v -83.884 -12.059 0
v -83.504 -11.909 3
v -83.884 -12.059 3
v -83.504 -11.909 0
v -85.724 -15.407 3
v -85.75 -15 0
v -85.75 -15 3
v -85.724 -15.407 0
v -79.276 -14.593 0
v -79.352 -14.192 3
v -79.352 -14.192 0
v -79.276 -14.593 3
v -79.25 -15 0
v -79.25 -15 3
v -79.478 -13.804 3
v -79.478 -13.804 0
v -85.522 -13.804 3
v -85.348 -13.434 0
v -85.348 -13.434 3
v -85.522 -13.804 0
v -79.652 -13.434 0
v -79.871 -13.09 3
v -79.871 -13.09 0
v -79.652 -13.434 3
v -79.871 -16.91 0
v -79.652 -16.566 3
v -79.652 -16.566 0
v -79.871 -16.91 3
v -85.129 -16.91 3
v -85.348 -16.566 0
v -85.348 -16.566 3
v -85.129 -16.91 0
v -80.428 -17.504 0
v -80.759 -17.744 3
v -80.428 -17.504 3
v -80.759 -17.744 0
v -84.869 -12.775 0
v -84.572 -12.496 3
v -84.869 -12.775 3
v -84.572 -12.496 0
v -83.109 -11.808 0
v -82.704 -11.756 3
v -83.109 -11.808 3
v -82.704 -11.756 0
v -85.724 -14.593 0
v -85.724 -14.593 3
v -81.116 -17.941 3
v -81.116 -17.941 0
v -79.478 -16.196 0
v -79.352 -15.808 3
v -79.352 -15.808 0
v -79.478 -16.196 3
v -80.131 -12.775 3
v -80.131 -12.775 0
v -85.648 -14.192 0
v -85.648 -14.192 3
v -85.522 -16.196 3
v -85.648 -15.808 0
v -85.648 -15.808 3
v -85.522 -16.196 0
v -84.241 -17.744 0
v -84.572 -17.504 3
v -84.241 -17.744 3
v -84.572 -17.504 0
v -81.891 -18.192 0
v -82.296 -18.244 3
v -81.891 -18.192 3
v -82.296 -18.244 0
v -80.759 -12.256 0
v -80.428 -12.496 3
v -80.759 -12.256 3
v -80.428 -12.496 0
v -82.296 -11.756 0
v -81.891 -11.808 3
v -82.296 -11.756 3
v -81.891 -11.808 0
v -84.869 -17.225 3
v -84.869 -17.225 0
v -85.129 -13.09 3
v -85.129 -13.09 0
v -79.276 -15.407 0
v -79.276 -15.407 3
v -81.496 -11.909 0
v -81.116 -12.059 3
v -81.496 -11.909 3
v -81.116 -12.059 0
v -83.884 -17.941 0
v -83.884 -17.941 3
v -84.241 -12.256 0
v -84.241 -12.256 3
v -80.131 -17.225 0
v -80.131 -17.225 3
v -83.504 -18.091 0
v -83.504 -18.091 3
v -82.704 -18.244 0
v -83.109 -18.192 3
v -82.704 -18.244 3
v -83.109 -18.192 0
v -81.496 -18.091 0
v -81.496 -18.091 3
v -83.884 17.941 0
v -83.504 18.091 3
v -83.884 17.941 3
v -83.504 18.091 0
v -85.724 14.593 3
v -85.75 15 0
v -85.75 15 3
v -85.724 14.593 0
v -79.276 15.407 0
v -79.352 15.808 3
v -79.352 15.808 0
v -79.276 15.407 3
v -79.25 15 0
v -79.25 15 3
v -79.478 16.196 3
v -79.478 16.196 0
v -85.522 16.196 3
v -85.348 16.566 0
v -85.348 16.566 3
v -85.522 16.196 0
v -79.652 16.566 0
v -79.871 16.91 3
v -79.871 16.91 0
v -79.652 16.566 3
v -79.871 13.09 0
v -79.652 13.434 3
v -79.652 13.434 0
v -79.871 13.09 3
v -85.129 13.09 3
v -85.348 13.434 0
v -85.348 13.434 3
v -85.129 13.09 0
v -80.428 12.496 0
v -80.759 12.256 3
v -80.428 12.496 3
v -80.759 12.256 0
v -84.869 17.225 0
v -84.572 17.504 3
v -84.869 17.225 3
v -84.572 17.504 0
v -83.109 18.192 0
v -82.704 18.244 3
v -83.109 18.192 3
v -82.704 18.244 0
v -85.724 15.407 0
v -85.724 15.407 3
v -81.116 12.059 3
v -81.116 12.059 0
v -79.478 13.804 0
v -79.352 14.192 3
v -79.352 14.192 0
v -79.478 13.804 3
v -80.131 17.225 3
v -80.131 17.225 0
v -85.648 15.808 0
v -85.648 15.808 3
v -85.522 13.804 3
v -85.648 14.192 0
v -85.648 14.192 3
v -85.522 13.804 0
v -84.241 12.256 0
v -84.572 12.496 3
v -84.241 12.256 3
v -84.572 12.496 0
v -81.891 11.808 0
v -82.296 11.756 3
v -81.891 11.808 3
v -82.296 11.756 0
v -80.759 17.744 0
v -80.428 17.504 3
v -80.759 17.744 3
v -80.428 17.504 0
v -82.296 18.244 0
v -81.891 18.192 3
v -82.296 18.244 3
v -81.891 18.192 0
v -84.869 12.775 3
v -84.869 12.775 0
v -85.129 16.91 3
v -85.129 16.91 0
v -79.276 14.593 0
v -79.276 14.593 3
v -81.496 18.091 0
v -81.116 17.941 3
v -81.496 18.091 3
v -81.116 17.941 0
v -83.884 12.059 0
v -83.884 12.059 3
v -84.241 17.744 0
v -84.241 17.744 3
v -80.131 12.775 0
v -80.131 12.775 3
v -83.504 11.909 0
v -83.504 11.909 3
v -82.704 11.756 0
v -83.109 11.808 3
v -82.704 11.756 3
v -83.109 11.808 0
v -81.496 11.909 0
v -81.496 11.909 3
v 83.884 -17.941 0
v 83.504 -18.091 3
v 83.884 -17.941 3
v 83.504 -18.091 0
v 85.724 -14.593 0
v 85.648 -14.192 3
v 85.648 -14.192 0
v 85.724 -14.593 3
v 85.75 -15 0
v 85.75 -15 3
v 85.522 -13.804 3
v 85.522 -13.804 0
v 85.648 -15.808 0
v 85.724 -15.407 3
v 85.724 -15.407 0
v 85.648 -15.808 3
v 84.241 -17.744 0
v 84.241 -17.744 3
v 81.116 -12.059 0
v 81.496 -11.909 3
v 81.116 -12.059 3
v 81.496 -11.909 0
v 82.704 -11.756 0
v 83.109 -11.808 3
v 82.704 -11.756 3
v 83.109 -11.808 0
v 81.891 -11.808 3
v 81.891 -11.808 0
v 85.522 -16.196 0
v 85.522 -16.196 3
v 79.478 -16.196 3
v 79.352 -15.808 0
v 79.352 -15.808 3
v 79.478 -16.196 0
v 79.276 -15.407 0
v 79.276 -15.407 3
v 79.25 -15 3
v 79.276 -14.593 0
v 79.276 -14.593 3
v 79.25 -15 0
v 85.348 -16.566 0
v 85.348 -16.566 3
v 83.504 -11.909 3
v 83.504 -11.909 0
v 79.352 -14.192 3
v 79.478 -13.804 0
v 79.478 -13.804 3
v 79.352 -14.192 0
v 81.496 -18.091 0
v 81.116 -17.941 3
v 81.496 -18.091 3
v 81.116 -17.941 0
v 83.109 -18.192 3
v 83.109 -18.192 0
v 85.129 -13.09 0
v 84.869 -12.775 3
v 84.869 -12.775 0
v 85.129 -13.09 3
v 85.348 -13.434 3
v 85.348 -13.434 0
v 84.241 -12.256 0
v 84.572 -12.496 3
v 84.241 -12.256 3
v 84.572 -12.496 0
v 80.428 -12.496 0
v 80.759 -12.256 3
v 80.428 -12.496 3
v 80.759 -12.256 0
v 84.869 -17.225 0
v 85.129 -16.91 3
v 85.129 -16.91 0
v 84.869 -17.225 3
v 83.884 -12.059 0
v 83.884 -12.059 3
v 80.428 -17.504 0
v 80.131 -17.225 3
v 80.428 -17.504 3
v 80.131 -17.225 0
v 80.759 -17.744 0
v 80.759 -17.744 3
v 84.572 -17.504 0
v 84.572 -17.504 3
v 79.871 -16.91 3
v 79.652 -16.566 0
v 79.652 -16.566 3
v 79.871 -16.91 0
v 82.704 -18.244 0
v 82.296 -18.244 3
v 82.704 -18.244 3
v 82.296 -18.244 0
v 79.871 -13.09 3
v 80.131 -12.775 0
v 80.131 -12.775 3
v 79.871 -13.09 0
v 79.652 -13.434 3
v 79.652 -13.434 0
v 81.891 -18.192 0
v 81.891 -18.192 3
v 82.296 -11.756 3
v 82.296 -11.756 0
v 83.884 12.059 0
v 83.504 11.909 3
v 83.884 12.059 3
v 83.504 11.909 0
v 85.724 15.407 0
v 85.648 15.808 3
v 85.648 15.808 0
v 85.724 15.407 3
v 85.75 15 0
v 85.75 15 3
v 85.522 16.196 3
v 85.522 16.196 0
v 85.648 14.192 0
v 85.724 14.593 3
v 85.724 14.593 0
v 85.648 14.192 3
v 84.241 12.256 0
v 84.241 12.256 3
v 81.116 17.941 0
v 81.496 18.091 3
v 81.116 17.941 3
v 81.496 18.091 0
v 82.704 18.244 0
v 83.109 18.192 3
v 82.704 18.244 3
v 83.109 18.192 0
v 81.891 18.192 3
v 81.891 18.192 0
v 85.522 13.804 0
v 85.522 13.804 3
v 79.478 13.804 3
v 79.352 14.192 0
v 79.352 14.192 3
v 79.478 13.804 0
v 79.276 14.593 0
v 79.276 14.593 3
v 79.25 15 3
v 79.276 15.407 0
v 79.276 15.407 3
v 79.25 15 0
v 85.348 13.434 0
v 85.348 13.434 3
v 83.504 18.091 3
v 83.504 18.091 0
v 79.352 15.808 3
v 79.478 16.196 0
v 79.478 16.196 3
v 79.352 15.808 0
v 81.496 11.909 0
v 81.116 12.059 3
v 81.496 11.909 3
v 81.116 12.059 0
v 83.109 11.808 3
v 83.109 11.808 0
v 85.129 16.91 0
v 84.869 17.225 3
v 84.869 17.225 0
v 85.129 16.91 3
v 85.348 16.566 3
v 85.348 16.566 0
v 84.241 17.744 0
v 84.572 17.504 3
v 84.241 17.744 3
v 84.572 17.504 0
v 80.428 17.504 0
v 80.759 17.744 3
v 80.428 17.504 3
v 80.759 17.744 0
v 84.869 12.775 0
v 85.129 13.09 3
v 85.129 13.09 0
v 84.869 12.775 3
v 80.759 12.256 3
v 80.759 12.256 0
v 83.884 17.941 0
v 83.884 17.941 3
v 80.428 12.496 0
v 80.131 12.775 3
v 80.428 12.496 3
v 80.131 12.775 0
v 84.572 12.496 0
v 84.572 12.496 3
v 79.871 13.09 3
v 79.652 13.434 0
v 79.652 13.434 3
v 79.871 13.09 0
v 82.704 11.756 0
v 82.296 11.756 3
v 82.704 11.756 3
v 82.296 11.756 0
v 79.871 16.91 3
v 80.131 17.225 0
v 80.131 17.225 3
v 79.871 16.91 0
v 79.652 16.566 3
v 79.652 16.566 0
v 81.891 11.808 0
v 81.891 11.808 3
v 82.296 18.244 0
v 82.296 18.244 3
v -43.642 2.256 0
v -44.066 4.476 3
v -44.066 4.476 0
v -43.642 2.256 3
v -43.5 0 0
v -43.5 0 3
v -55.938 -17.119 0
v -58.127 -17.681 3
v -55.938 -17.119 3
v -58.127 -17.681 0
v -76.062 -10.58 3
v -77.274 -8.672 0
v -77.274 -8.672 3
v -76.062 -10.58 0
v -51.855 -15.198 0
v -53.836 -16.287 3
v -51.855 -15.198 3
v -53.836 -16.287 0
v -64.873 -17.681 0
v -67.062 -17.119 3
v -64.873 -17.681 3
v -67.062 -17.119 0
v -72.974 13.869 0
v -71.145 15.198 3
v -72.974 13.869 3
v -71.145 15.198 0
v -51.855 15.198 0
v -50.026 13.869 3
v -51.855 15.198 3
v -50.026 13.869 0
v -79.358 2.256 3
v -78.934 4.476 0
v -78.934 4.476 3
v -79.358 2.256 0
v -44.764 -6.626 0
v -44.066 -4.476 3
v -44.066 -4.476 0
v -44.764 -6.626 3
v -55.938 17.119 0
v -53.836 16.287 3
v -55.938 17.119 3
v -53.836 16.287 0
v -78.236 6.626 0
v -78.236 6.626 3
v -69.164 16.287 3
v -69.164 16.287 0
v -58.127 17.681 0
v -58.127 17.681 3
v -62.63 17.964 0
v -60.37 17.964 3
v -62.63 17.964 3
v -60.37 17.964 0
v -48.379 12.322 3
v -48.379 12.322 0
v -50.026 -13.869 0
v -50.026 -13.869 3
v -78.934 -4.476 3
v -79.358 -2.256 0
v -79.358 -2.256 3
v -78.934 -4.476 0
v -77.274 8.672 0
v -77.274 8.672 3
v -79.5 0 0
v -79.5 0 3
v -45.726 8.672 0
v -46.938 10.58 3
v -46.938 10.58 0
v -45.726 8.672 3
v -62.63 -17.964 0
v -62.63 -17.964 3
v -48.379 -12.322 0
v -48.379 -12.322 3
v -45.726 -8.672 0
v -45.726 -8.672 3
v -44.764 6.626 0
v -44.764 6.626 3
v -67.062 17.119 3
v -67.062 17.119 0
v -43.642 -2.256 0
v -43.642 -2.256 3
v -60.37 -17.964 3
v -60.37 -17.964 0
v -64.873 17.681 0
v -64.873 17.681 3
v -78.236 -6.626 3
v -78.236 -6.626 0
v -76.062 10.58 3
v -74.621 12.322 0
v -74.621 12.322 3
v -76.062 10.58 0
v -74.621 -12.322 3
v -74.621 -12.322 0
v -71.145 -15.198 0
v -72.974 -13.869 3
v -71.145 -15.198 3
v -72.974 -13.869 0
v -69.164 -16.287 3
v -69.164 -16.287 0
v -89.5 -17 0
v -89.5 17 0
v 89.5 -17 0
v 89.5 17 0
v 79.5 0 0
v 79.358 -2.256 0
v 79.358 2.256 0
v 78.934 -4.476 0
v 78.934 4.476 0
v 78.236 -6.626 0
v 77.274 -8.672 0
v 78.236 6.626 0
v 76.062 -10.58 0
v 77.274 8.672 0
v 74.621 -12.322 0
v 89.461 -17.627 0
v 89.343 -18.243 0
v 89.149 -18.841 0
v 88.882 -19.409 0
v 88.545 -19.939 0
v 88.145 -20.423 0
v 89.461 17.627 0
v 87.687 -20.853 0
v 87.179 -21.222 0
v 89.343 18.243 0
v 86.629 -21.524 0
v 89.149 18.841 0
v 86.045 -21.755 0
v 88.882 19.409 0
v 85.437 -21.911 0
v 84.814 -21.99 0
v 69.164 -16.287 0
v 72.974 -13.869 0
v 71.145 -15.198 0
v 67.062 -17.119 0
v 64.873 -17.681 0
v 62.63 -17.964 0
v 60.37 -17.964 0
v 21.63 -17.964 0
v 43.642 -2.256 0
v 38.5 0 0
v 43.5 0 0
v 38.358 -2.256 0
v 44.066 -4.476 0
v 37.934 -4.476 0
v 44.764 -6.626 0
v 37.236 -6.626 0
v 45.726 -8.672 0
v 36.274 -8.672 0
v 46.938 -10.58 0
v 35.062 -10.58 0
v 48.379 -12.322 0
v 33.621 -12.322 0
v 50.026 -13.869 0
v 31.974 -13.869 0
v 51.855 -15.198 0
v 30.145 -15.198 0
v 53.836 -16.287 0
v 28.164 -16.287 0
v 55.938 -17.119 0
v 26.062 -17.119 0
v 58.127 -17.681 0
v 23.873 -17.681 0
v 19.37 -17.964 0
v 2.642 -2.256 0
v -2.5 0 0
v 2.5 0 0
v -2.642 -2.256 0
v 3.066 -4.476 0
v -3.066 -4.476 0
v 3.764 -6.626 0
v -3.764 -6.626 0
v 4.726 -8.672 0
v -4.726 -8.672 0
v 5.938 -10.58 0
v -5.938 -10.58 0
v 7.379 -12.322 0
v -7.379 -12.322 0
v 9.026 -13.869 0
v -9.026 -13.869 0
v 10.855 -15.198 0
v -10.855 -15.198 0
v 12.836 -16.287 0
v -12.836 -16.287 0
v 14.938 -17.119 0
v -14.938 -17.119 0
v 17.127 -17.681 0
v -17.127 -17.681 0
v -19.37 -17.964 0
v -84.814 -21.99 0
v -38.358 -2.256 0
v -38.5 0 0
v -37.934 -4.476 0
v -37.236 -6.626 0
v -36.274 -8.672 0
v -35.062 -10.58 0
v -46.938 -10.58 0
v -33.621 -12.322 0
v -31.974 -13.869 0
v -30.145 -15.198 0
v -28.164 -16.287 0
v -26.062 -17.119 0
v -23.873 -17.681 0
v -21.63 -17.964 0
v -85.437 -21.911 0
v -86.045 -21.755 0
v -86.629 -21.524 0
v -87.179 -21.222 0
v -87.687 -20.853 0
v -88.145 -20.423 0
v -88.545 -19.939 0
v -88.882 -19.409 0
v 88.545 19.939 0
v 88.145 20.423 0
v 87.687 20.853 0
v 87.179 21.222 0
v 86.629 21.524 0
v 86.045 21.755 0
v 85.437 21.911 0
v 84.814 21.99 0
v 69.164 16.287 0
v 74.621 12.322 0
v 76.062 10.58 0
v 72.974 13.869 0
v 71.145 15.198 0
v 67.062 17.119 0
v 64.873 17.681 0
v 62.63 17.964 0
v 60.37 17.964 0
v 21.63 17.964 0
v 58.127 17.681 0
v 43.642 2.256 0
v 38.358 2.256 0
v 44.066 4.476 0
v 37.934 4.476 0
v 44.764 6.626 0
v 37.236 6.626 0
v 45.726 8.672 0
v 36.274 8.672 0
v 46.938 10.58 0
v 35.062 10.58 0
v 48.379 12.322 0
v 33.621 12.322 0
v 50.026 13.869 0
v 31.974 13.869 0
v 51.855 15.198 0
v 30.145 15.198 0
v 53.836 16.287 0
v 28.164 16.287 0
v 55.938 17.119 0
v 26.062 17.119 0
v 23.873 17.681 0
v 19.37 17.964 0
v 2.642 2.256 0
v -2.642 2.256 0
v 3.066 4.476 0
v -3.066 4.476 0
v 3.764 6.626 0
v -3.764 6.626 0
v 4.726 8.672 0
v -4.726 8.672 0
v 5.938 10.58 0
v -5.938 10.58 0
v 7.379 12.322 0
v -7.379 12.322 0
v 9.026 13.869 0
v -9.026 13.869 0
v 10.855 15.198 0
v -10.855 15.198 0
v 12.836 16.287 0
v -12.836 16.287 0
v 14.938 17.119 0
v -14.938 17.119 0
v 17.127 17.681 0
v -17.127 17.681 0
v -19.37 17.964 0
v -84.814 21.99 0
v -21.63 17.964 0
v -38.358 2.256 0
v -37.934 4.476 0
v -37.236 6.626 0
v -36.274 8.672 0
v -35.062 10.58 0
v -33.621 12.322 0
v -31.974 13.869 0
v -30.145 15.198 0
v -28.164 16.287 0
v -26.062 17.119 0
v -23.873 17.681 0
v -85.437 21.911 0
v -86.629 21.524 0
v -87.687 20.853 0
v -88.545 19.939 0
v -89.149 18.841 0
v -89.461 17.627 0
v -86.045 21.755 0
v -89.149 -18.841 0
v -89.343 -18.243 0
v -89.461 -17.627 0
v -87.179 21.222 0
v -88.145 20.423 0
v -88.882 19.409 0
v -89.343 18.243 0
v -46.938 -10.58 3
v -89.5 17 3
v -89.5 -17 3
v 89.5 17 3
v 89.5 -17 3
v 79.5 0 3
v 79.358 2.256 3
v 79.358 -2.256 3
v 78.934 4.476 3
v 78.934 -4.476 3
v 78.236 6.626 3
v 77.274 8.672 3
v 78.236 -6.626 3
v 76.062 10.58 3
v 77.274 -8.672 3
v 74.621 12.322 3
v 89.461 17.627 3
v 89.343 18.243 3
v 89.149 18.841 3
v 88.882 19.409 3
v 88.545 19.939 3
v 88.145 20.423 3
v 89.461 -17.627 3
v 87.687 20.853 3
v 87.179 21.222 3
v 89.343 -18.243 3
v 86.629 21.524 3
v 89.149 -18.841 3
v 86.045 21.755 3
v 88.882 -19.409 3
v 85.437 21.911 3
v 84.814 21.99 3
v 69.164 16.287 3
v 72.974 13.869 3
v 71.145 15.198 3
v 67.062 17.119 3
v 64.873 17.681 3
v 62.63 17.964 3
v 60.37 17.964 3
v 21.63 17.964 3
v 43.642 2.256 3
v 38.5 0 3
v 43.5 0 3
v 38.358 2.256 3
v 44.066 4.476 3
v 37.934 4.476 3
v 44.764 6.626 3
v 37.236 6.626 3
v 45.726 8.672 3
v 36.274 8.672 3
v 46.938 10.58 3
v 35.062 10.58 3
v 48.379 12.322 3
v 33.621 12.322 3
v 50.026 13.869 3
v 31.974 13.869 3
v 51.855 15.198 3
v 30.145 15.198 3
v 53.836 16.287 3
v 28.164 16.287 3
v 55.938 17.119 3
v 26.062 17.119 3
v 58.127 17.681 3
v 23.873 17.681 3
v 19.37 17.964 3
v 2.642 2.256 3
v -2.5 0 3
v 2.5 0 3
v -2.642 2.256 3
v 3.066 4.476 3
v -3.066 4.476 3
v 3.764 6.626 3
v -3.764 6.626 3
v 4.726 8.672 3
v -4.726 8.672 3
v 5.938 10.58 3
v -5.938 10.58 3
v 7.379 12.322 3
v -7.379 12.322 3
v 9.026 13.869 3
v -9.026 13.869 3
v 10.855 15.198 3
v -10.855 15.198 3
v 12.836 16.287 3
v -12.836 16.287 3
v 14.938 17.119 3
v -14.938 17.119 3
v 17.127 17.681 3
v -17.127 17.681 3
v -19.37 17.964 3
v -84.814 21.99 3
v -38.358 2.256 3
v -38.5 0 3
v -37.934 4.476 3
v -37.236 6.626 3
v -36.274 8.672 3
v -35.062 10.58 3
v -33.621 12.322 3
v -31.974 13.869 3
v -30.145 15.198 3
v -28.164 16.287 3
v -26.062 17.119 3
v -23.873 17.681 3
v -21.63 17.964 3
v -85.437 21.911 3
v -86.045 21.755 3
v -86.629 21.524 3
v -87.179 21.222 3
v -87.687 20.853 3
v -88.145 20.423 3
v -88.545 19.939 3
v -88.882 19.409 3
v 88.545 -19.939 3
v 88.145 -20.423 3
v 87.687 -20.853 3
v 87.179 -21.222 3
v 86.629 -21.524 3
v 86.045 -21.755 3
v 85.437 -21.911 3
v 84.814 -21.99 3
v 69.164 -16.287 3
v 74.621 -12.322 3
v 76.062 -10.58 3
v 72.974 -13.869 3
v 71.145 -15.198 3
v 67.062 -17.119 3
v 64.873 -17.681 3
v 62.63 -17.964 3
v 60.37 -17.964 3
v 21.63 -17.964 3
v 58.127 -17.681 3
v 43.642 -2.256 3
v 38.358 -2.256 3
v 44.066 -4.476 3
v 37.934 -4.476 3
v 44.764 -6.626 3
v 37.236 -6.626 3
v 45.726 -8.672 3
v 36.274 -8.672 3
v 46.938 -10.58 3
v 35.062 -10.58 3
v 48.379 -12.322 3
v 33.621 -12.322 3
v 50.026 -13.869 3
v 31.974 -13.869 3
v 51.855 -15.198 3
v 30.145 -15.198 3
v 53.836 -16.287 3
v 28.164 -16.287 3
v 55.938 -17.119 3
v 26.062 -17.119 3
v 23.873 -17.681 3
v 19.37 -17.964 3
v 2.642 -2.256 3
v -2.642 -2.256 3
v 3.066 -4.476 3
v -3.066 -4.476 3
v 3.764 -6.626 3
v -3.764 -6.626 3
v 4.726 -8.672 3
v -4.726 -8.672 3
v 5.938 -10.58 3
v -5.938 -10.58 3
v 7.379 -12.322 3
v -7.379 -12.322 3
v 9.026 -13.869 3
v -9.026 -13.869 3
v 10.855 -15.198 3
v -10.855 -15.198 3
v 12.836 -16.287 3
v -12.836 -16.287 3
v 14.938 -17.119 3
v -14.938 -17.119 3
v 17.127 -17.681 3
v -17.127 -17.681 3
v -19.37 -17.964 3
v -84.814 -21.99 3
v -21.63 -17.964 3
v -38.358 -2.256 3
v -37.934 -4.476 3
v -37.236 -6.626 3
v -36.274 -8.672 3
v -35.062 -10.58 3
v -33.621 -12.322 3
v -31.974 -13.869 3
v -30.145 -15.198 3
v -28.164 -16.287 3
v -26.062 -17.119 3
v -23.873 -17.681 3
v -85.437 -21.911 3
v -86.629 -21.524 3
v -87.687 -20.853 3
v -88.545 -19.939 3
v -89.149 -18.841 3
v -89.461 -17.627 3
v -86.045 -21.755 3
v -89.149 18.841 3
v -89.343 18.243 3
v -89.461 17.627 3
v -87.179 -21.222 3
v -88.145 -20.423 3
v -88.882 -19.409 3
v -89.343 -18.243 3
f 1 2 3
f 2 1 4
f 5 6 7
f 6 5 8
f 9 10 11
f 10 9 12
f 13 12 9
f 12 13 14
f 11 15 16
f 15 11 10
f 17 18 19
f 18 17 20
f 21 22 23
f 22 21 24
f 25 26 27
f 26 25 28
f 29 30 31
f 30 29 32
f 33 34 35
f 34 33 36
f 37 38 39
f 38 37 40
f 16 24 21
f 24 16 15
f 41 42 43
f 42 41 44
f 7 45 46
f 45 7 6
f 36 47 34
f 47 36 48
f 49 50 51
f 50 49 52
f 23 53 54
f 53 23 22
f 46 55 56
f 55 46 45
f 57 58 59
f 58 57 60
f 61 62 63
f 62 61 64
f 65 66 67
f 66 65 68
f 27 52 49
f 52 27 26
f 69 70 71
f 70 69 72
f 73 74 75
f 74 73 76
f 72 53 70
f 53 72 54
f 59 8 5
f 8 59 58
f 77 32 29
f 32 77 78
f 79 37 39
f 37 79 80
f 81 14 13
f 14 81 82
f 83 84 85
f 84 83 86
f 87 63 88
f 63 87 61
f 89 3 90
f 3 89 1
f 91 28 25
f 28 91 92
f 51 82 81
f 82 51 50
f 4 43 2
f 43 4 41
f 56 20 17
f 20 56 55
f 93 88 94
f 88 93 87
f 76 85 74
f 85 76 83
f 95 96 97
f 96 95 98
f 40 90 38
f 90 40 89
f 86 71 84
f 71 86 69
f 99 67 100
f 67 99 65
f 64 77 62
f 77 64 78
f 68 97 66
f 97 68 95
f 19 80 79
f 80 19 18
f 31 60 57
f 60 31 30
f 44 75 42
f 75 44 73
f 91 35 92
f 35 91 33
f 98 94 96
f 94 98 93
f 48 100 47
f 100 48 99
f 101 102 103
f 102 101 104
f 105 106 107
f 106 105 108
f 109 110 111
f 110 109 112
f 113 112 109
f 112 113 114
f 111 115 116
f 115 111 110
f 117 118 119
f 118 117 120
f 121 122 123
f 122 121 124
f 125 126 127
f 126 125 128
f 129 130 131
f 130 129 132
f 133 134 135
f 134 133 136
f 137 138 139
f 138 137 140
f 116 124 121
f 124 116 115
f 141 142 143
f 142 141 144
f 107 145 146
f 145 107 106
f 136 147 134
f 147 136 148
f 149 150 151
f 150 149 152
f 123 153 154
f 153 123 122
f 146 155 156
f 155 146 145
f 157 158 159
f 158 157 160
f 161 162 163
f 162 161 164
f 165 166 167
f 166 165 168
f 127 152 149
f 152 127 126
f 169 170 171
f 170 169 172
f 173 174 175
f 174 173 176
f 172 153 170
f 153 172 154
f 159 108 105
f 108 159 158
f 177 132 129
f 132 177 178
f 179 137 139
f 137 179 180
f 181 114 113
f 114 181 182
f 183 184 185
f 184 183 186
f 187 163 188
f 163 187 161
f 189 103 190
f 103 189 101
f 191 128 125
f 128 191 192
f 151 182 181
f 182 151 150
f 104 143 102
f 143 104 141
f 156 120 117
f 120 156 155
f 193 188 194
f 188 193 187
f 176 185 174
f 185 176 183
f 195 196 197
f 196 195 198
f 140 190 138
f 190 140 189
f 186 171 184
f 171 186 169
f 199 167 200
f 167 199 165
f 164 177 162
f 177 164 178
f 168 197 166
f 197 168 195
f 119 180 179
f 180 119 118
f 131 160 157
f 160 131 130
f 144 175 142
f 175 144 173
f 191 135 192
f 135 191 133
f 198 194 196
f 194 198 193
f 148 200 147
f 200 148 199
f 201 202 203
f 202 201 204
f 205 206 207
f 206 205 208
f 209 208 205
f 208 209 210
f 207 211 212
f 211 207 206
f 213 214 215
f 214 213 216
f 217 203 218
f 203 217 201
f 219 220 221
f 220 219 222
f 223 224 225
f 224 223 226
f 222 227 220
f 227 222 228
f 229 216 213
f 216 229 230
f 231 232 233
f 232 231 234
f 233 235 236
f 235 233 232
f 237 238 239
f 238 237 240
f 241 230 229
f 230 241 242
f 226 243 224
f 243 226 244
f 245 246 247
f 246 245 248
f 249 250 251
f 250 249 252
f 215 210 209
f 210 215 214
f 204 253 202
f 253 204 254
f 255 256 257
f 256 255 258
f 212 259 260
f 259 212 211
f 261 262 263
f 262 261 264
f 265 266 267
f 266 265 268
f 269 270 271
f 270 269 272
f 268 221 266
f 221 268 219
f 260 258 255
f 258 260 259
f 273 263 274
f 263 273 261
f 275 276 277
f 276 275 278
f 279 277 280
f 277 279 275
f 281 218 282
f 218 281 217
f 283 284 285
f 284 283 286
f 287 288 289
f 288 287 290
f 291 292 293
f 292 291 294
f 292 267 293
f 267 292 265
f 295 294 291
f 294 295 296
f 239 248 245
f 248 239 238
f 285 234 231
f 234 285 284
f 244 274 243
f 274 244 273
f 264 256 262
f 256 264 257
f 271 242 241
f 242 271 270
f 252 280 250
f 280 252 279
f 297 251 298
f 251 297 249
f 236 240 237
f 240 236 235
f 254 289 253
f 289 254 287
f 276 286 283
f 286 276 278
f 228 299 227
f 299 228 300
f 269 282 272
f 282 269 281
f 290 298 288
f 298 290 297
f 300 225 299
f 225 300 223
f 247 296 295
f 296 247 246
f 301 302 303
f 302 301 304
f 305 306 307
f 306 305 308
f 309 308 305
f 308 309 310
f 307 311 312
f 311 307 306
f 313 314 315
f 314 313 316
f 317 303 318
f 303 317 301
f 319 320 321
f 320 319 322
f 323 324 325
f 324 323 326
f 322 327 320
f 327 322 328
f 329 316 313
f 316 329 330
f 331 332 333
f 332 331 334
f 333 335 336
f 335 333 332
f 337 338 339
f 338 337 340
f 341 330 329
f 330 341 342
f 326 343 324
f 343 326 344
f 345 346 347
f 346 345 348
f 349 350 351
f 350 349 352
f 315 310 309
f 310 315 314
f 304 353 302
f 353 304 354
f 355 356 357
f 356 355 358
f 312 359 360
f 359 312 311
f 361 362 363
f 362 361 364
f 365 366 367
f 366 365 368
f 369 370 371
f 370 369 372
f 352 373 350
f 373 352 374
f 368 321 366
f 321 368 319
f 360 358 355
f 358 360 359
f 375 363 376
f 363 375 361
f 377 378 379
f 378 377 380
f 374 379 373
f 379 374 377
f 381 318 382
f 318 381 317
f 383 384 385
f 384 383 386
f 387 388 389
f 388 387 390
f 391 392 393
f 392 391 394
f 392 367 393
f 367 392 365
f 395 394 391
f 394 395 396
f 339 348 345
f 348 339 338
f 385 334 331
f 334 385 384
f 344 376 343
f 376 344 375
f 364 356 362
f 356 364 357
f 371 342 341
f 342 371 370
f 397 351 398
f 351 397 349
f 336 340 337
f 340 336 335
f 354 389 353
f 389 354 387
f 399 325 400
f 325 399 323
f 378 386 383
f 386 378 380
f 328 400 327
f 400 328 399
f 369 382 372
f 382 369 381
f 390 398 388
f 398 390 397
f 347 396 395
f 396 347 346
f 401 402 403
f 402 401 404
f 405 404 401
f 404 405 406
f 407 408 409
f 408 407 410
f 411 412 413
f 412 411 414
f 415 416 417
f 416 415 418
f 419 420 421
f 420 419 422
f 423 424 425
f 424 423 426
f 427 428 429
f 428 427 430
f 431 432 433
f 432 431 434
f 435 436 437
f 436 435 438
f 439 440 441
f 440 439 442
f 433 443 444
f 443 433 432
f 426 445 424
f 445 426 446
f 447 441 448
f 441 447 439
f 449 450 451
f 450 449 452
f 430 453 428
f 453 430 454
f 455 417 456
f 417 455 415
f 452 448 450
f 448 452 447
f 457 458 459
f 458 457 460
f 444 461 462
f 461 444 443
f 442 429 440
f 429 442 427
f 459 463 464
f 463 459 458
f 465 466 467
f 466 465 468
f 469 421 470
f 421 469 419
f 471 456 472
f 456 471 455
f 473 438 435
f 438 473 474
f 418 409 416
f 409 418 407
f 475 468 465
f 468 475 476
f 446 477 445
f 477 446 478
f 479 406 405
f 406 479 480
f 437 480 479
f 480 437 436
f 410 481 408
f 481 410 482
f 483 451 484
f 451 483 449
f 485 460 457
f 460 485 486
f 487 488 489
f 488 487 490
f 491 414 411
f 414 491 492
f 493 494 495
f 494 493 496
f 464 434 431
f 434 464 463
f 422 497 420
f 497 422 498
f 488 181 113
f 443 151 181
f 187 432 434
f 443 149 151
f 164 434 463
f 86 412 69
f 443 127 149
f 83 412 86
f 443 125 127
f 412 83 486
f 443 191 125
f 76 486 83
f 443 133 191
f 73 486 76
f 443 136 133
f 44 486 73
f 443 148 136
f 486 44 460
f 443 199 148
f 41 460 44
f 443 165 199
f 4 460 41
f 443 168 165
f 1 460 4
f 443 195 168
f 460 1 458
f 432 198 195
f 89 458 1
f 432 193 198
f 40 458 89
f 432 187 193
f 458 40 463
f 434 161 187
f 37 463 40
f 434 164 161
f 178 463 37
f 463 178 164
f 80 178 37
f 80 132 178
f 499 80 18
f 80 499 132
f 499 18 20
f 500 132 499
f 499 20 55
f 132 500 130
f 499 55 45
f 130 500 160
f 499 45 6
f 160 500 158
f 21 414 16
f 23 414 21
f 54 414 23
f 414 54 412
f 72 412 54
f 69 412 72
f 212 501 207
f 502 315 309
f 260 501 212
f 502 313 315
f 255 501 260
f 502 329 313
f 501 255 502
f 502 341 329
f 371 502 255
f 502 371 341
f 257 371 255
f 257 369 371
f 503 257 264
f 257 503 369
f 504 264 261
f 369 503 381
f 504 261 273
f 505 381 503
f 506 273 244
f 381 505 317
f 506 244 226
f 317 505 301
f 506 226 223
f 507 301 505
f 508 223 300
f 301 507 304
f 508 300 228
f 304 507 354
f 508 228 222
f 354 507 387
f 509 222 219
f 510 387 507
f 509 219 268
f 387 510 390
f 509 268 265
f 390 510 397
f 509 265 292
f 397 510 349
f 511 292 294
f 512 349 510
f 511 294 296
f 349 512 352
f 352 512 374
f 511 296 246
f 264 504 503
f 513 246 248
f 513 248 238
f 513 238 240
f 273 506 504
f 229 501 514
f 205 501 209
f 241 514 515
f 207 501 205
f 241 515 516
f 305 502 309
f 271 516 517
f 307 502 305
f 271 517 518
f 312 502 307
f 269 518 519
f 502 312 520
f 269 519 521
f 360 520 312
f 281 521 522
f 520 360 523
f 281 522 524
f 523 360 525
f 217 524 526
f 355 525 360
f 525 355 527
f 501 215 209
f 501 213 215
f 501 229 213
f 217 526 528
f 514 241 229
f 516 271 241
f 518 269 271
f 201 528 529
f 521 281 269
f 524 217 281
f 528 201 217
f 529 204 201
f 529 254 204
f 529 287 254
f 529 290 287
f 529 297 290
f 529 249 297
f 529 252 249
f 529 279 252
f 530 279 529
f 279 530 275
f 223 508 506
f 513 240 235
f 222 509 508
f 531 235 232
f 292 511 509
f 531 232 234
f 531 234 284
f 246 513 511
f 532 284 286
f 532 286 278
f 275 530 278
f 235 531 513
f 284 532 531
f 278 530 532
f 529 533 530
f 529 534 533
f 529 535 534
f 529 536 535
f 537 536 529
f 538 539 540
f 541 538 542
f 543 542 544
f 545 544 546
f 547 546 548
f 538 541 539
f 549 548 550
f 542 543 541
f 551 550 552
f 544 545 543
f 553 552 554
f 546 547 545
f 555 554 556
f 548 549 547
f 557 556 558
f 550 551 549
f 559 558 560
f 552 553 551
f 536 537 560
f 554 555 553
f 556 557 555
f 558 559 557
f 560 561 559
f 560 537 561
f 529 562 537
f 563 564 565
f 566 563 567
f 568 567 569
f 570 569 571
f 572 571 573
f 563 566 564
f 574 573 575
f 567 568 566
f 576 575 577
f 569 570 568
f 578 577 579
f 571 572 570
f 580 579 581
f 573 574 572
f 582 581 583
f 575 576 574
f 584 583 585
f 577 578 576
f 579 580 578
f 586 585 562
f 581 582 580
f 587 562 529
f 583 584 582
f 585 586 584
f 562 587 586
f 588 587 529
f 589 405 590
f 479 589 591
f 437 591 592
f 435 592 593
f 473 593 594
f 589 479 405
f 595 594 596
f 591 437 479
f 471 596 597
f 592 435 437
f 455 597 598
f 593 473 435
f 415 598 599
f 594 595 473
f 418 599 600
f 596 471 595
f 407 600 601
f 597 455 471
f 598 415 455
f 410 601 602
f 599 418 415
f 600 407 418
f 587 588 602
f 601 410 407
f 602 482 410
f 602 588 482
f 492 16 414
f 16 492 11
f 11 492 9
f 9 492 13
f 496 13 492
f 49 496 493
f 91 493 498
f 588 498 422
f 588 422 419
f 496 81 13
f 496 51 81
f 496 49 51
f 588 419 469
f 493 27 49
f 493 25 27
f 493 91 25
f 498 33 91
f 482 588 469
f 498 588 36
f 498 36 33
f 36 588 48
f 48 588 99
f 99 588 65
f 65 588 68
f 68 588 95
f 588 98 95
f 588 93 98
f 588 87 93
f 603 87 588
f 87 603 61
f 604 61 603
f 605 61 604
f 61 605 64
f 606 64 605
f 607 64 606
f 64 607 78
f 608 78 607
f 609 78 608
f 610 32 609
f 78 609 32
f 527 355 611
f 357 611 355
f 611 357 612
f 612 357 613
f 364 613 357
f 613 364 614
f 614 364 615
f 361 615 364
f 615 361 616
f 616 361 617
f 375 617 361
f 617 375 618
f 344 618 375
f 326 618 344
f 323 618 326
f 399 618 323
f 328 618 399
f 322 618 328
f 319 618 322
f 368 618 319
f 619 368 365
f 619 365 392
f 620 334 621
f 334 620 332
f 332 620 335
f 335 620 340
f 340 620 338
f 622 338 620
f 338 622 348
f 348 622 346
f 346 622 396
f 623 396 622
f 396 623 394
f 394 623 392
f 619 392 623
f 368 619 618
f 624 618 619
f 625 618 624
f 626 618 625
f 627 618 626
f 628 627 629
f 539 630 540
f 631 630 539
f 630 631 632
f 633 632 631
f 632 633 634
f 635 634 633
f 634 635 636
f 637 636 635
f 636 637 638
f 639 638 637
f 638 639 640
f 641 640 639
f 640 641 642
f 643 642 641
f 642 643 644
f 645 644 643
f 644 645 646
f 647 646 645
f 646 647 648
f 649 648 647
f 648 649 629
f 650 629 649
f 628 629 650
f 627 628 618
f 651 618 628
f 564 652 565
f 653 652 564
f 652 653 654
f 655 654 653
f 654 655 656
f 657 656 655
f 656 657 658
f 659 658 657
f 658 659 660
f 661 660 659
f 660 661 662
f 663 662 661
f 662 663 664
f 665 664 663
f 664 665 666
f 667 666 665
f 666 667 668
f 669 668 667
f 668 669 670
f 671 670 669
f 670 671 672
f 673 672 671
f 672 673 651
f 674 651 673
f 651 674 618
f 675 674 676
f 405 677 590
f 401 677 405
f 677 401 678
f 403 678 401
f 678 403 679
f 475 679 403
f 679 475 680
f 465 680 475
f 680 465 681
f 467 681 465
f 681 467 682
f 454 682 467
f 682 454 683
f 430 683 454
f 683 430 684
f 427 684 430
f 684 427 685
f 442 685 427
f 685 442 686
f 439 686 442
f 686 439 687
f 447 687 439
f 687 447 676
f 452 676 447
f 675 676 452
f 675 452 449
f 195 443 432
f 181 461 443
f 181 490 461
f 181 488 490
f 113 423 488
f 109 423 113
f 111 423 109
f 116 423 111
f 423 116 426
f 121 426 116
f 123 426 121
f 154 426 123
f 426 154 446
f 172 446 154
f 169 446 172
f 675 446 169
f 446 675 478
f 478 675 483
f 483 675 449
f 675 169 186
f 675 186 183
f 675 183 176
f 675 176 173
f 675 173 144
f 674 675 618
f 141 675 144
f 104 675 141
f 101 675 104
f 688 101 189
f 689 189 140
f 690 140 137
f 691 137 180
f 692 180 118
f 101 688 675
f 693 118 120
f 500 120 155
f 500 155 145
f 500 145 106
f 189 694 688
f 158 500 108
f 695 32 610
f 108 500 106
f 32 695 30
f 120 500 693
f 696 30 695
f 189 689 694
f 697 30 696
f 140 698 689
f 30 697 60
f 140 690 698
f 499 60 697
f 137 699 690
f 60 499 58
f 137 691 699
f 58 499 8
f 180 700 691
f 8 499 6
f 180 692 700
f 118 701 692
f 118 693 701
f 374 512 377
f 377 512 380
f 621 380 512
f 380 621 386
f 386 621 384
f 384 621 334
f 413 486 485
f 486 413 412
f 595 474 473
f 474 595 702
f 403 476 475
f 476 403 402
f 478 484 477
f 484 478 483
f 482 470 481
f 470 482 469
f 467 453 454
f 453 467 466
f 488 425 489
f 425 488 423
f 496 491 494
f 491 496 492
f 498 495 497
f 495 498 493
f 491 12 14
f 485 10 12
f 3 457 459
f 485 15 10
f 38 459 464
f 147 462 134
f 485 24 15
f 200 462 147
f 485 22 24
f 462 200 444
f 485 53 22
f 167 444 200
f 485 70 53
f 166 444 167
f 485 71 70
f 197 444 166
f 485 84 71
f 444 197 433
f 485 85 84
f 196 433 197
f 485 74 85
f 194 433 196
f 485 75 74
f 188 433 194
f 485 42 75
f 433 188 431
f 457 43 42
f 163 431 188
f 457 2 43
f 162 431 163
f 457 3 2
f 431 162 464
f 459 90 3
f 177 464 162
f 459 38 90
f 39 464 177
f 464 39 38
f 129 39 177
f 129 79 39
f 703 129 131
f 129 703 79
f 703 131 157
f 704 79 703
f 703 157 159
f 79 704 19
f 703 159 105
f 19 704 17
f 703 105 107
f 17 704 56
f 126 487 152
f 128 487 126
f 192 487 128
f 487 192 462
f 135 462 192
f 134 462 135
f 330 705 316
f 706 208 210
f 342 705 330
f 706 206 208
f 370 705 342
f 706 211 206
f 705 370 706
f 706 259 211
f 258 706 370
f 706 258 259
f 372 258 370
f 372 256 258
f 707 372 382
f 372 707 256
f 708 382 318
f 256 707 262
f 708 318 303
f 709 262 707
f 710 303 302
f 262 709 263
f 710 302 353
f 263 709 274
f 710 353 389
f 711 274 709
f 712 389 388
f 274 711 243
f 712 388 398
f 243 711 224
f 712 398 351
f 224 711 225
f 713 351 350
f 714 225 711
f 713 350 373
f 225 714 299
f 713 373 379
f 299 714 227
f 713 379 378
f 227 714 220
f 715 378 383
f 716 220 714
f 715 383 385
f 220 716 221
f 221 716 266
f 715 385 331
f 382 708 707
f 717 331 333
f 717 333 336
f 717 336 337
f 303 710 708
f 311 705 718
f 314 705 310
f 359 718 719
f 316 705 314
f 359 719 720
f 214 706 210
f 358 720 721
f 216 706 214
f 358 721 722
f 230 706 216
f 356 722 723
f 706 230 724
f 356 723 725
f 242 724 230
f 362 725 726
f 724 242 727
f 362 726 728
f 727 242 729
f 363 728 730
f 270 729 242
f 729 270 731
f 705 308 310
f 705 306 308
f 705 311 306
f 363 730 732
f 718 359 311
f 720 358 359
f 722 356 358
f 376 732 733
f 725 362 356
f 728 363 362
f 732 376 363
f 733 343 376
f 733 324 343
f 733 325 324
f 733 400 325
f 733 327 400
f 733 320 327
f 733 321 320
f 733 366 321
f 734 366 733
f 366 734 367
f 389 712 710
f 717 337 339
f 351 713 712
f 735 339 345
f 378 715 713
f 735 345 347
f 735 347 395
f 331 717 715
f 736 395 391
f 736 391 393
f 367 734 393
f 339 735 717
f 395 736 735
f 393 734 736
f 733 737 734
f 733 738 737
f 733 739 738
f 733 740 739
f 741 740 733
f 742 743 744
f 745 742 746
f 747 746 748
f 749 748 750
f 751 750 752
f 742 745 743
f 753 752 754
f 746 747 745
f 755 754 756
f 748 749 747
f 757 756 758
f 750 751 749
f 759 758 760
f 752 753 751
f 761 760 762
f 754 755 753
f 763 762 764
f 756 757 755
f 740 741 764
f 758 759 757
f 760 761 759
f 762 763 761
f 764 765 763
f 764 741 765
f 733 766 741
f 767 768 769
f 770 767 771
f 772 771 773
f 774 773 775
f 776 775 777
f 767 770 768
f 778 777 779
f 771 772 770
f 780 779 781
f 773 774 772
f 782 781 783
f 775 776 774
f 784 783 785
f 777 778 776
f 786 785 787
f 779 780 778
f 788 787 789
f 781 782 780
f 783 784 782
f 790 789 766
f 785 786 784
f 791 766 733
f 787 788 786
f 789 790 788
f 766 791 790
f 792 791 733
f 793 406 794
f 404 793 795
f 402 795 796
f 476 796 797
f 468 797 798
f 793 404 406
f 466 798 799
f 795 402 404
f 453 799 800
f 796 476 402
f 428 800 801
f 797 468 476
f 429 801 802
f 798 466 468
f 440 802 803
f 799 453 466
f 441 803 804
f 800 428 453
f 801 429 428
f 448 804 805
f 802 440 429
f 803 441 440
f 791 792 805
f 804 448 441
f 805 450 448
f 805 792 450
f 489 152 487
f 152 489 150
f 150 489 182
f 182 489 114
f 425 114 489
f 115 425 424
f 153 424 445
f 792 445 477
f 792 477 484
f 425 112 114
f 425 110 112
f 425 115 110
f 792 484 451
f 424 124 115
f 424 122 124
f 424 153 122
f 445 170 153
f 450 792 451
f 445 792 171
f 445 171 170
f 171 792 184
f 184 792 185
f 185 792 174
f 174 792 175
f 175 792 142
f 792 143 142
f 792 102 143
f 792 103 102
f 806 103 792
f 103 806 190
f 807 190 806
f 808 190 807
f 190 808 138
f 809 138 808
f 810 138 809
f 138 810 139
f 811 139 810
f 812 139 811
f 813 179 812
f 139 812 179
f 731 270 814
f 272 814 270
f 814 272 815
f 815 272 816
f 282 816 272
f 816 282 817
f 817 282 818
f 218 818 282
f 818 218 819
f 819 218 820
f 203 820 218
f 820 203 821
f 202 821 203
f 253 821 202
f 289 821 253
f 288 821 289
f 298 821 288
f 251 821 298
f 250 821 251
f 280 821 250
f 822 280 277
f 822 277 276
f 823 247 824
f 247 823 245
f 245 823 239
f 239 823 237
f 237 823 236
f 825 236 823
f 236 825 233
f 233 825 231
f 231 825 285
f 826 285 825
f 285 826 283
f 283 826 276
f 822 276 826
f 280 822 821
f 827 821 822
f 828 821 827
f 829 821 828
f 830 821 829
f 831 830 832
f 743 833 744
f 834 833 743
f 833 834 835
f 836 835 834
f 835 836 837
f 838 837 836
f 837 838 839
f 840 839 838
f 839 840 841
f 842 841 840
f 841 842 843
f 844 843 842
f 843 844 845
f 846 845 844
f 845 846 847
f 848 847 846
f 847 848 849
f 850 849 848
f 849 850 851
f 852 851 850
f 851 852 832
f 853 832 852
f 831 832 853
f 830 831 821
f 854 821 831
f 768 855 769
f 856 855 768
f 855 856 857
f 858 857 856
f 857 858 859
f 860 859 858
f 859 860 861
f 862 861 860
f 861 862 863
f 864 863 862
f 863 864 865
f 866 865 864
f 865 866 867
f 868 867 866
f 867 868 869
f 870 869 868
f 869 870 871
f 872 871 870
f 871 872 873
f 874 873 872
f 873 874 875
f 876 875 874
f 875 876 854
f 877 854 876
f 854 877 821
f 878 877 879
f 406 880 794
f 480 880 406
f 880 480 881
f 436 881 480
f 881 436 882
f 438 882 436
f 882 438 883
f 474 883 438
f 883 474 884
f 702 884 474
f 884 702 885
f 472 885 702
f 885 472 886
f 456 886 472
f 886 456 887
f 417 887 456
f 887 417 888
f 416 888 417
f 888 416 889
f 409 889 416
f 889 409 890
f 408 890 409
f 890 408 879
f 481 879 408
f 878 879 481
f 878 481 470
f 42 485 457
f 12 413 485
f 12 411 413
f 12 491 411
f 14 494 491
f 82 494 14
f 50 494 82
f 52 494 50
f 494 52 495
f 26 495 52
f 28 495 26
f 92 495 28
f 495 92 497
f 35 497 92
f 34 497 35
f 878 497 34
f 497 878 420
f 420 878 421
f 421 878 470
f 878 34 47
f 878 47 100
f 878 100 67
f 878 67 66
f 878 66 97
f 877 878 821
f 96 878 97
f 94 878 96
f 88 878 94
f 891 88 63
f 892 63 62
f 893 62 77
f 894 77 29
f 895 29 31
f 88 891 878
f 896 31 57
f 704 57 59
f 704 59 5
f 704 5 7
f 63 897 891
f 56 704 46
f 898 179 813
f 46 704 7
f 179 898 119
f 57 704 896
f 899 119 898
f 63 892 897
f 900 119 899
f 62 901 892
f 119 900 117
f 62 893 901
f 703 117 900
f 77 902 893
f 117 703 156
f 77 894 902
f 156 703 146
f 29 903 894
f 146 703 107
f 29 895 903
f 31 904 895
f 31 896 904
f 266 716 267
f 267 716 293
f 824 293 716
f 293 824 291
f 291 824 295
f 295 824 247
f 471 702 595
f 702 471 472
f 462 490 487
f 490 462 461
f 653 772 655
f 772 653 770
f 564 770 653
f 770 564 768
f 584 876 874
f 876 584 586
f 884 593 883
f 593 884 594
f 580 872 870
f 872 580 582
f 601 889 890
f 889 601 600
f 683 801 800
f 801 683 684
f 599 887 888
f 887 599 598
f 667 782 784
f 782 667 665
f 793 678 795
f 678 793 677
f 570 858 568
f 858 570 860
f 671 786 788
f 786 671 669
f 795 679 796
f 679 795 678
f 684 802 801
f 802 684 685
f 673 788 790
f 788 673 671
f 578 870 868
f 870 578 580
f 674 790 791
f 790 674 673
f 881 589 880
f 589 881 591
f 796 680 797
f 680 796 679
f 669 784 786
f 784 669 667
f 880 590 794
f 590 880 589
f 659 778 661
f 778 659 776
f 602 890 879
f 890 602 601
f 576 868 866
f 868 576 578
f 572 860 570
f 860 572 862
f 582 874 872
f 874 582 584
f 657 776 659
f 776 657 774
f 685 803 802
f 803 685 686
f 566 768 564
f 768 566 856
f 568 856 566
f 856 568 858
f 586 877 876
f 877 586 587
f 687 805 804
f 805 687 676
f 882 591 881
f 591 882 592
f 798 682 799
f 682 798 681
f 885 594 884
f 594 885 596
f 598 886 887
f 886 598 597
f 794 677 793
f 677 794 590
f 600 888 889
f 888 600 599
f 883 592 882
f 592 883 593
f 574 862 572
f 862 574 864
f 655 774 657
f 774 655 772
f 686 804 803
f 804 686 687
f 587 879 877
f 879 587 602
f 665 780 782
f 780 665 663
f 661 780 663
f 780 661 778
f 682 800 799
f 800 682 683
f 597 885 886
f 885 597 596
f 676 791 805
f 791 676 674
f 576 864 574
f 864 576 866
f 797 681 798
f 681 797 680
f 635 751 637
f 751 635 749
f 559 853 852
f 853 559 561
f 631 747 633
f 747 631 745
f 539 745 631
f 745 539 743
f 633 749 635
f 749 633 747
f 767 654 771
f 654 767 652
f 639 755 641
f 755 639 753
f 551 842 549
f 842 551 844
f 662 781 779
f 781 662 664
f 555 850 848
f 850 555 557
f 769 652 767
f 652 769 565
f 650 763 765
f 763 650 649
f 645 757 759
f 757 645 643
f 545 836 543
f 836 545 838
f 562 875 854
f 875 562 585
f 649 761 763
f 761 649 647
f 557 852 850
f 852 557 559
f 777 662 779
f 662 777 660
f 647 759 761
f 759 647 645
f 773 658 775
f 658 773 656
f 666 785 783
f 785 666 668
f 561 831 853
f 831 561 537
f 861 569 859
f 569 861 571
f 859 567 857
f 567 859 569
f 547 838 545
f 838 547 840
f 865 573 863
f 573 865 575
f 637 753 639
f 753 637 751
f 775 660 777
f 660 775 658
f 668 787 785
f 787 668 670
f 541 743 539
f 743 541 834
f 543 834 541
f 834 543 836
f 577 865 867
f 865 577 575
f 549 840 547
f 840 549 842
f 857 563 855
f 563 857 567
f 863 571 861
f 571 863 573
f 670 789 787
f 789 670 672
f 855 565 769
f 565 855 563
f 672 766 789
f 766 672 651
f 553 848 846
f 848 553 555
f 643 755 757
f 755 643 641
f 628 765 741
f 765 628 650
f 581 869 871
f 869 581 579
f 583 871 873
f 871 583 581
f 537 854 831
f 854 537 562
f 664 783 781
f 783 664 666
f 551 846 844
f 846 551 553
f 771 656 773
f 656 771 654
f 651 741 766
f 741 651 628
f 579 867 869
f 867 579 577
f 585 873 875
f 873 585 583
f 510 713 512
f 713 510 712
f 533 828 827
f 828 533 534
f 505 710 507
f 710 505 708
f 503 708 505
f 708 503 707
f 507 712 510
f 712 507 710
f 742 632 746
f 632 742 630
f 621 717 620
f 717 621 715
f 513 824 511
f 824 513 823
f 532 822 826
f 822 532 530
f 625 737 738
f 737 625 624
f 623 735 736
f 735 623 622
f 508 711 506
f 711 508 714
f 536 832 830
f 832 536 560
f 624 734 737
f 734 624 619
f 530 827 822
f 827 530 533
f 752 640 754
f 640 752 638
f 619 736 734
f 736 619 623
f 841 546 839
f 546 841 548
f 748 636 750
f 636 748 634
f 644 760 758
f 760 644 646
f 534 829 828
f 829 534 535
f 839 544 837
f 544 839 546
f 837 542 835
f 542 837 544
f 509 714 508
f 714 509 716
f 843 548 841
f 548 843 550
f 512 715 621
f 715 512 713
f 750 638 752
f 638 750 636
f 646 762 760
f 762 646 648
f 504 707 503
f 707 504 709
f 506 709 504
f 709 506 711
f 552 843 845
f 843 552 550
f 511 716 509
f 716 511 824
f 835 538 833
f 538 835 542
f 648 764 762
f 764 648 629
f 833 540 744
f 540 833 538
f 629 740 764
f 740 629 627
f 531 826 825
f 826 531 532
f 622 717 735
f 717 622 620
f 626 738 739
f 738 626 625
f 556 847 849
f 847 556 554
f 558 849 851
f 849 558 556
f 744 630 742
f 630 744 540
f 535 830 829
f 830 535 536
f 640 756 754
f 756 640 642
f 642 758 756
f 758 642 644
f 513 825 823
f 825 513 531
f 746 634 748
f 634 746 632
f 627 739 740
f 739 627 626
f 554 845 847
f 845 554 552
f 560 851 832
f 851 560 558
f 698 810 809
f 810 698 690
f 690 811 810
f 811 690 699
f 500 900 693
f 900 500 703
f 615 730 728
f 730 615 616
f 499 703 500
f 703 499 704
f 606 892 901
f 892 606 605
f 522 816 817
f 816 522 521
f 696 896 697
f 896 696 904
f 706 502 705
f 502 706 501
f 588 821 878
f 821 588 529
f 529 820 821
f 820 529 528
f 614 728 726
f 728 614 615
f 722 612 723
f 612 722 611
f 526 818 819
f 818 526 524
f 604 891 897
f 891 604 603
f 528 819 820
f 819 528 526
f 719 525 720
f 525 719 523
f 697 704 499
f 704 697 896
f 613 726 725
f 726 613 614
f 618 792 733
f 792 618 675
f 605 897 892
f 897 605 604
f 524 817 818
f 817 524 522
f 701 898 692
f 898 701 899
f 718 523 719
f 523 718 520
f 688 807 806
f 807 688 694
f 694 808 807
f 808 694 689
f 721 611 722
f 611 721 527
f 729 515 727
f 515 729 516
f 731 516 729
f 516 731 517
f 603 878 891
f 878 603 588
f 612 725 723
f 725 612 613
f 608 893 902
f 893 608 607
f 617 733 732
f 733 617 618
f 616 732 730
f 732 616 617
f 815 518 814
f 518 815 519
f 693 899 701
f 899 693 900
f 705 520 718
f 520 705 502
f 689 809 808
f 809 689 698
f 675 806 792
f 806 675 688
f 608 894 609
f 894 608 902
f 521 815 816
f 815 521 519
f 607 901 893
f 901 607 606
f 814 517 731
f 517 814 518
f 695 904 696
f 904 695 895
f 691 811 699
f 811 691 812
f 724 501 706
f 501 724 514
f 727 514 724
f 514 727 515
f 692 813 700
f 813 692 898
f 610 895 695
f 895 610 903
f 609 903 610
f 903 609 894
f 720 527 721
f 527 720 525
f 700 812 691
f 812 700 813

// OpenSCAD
$fn = 50;


difference() {
	union() {
		hull() {
			translate(v = [-84.5000000000, 17.0000000000, 0]) {
				cylinder(h = 3, r = 5);
			}
			translate(v = [84.5000000000, 17.0000000000, 0]) {
				cylinder(h = 3, r = 5);
			}
			translate(v = [-84.5000000000, -17.0000000000, 0]) {
				cylinder(h = 3, r = 5);
			}
			translate(v = [84.5000000000, -17.0000000000, 0]) {
				cylinder(h = 3, r = 5);
			}
		}
	}
	union() {
		#translate(v = [-82.5000000000, -15.0000000000, -100.0000000000]) {
			cylinder(h = 200, r = 3.2500000000);
		}
		#translate(v = [-82.5000000000, 15.0000000000, -100.0000000000]) {
			cylinder(h = 200, r = 3.2500000000);
		}
		#translate(v = [82.5000000000, -15.0000000000, -100.0000000000]) {
			cylinder(h = 200, r = 3.2500000000);
		}
		#translate(v = [82.5000000000, 15.0000000000, -100.0000000000]) {
			cylinder(h = 200, r = 3.2500000000);
		}
		#translate(v = [-61.5000000000, 0, 0]) {
			cylinder(h = 3, r = 18.0000000000);
		}
		#translate(v = [-20.5000000000, 0, 0]) {
			cylinder(h = 3, r = 18.0000000000);
		}
		#translate(v = [20.5000000000, 0, 0]) {
			cylinder(h = 3, r = 18.0000000000);
		}
		#translate(v = [61.5000000000, 0, 0]) {
			cylinder(h = 3, r = 18.0000000000);
		}
	}
}
